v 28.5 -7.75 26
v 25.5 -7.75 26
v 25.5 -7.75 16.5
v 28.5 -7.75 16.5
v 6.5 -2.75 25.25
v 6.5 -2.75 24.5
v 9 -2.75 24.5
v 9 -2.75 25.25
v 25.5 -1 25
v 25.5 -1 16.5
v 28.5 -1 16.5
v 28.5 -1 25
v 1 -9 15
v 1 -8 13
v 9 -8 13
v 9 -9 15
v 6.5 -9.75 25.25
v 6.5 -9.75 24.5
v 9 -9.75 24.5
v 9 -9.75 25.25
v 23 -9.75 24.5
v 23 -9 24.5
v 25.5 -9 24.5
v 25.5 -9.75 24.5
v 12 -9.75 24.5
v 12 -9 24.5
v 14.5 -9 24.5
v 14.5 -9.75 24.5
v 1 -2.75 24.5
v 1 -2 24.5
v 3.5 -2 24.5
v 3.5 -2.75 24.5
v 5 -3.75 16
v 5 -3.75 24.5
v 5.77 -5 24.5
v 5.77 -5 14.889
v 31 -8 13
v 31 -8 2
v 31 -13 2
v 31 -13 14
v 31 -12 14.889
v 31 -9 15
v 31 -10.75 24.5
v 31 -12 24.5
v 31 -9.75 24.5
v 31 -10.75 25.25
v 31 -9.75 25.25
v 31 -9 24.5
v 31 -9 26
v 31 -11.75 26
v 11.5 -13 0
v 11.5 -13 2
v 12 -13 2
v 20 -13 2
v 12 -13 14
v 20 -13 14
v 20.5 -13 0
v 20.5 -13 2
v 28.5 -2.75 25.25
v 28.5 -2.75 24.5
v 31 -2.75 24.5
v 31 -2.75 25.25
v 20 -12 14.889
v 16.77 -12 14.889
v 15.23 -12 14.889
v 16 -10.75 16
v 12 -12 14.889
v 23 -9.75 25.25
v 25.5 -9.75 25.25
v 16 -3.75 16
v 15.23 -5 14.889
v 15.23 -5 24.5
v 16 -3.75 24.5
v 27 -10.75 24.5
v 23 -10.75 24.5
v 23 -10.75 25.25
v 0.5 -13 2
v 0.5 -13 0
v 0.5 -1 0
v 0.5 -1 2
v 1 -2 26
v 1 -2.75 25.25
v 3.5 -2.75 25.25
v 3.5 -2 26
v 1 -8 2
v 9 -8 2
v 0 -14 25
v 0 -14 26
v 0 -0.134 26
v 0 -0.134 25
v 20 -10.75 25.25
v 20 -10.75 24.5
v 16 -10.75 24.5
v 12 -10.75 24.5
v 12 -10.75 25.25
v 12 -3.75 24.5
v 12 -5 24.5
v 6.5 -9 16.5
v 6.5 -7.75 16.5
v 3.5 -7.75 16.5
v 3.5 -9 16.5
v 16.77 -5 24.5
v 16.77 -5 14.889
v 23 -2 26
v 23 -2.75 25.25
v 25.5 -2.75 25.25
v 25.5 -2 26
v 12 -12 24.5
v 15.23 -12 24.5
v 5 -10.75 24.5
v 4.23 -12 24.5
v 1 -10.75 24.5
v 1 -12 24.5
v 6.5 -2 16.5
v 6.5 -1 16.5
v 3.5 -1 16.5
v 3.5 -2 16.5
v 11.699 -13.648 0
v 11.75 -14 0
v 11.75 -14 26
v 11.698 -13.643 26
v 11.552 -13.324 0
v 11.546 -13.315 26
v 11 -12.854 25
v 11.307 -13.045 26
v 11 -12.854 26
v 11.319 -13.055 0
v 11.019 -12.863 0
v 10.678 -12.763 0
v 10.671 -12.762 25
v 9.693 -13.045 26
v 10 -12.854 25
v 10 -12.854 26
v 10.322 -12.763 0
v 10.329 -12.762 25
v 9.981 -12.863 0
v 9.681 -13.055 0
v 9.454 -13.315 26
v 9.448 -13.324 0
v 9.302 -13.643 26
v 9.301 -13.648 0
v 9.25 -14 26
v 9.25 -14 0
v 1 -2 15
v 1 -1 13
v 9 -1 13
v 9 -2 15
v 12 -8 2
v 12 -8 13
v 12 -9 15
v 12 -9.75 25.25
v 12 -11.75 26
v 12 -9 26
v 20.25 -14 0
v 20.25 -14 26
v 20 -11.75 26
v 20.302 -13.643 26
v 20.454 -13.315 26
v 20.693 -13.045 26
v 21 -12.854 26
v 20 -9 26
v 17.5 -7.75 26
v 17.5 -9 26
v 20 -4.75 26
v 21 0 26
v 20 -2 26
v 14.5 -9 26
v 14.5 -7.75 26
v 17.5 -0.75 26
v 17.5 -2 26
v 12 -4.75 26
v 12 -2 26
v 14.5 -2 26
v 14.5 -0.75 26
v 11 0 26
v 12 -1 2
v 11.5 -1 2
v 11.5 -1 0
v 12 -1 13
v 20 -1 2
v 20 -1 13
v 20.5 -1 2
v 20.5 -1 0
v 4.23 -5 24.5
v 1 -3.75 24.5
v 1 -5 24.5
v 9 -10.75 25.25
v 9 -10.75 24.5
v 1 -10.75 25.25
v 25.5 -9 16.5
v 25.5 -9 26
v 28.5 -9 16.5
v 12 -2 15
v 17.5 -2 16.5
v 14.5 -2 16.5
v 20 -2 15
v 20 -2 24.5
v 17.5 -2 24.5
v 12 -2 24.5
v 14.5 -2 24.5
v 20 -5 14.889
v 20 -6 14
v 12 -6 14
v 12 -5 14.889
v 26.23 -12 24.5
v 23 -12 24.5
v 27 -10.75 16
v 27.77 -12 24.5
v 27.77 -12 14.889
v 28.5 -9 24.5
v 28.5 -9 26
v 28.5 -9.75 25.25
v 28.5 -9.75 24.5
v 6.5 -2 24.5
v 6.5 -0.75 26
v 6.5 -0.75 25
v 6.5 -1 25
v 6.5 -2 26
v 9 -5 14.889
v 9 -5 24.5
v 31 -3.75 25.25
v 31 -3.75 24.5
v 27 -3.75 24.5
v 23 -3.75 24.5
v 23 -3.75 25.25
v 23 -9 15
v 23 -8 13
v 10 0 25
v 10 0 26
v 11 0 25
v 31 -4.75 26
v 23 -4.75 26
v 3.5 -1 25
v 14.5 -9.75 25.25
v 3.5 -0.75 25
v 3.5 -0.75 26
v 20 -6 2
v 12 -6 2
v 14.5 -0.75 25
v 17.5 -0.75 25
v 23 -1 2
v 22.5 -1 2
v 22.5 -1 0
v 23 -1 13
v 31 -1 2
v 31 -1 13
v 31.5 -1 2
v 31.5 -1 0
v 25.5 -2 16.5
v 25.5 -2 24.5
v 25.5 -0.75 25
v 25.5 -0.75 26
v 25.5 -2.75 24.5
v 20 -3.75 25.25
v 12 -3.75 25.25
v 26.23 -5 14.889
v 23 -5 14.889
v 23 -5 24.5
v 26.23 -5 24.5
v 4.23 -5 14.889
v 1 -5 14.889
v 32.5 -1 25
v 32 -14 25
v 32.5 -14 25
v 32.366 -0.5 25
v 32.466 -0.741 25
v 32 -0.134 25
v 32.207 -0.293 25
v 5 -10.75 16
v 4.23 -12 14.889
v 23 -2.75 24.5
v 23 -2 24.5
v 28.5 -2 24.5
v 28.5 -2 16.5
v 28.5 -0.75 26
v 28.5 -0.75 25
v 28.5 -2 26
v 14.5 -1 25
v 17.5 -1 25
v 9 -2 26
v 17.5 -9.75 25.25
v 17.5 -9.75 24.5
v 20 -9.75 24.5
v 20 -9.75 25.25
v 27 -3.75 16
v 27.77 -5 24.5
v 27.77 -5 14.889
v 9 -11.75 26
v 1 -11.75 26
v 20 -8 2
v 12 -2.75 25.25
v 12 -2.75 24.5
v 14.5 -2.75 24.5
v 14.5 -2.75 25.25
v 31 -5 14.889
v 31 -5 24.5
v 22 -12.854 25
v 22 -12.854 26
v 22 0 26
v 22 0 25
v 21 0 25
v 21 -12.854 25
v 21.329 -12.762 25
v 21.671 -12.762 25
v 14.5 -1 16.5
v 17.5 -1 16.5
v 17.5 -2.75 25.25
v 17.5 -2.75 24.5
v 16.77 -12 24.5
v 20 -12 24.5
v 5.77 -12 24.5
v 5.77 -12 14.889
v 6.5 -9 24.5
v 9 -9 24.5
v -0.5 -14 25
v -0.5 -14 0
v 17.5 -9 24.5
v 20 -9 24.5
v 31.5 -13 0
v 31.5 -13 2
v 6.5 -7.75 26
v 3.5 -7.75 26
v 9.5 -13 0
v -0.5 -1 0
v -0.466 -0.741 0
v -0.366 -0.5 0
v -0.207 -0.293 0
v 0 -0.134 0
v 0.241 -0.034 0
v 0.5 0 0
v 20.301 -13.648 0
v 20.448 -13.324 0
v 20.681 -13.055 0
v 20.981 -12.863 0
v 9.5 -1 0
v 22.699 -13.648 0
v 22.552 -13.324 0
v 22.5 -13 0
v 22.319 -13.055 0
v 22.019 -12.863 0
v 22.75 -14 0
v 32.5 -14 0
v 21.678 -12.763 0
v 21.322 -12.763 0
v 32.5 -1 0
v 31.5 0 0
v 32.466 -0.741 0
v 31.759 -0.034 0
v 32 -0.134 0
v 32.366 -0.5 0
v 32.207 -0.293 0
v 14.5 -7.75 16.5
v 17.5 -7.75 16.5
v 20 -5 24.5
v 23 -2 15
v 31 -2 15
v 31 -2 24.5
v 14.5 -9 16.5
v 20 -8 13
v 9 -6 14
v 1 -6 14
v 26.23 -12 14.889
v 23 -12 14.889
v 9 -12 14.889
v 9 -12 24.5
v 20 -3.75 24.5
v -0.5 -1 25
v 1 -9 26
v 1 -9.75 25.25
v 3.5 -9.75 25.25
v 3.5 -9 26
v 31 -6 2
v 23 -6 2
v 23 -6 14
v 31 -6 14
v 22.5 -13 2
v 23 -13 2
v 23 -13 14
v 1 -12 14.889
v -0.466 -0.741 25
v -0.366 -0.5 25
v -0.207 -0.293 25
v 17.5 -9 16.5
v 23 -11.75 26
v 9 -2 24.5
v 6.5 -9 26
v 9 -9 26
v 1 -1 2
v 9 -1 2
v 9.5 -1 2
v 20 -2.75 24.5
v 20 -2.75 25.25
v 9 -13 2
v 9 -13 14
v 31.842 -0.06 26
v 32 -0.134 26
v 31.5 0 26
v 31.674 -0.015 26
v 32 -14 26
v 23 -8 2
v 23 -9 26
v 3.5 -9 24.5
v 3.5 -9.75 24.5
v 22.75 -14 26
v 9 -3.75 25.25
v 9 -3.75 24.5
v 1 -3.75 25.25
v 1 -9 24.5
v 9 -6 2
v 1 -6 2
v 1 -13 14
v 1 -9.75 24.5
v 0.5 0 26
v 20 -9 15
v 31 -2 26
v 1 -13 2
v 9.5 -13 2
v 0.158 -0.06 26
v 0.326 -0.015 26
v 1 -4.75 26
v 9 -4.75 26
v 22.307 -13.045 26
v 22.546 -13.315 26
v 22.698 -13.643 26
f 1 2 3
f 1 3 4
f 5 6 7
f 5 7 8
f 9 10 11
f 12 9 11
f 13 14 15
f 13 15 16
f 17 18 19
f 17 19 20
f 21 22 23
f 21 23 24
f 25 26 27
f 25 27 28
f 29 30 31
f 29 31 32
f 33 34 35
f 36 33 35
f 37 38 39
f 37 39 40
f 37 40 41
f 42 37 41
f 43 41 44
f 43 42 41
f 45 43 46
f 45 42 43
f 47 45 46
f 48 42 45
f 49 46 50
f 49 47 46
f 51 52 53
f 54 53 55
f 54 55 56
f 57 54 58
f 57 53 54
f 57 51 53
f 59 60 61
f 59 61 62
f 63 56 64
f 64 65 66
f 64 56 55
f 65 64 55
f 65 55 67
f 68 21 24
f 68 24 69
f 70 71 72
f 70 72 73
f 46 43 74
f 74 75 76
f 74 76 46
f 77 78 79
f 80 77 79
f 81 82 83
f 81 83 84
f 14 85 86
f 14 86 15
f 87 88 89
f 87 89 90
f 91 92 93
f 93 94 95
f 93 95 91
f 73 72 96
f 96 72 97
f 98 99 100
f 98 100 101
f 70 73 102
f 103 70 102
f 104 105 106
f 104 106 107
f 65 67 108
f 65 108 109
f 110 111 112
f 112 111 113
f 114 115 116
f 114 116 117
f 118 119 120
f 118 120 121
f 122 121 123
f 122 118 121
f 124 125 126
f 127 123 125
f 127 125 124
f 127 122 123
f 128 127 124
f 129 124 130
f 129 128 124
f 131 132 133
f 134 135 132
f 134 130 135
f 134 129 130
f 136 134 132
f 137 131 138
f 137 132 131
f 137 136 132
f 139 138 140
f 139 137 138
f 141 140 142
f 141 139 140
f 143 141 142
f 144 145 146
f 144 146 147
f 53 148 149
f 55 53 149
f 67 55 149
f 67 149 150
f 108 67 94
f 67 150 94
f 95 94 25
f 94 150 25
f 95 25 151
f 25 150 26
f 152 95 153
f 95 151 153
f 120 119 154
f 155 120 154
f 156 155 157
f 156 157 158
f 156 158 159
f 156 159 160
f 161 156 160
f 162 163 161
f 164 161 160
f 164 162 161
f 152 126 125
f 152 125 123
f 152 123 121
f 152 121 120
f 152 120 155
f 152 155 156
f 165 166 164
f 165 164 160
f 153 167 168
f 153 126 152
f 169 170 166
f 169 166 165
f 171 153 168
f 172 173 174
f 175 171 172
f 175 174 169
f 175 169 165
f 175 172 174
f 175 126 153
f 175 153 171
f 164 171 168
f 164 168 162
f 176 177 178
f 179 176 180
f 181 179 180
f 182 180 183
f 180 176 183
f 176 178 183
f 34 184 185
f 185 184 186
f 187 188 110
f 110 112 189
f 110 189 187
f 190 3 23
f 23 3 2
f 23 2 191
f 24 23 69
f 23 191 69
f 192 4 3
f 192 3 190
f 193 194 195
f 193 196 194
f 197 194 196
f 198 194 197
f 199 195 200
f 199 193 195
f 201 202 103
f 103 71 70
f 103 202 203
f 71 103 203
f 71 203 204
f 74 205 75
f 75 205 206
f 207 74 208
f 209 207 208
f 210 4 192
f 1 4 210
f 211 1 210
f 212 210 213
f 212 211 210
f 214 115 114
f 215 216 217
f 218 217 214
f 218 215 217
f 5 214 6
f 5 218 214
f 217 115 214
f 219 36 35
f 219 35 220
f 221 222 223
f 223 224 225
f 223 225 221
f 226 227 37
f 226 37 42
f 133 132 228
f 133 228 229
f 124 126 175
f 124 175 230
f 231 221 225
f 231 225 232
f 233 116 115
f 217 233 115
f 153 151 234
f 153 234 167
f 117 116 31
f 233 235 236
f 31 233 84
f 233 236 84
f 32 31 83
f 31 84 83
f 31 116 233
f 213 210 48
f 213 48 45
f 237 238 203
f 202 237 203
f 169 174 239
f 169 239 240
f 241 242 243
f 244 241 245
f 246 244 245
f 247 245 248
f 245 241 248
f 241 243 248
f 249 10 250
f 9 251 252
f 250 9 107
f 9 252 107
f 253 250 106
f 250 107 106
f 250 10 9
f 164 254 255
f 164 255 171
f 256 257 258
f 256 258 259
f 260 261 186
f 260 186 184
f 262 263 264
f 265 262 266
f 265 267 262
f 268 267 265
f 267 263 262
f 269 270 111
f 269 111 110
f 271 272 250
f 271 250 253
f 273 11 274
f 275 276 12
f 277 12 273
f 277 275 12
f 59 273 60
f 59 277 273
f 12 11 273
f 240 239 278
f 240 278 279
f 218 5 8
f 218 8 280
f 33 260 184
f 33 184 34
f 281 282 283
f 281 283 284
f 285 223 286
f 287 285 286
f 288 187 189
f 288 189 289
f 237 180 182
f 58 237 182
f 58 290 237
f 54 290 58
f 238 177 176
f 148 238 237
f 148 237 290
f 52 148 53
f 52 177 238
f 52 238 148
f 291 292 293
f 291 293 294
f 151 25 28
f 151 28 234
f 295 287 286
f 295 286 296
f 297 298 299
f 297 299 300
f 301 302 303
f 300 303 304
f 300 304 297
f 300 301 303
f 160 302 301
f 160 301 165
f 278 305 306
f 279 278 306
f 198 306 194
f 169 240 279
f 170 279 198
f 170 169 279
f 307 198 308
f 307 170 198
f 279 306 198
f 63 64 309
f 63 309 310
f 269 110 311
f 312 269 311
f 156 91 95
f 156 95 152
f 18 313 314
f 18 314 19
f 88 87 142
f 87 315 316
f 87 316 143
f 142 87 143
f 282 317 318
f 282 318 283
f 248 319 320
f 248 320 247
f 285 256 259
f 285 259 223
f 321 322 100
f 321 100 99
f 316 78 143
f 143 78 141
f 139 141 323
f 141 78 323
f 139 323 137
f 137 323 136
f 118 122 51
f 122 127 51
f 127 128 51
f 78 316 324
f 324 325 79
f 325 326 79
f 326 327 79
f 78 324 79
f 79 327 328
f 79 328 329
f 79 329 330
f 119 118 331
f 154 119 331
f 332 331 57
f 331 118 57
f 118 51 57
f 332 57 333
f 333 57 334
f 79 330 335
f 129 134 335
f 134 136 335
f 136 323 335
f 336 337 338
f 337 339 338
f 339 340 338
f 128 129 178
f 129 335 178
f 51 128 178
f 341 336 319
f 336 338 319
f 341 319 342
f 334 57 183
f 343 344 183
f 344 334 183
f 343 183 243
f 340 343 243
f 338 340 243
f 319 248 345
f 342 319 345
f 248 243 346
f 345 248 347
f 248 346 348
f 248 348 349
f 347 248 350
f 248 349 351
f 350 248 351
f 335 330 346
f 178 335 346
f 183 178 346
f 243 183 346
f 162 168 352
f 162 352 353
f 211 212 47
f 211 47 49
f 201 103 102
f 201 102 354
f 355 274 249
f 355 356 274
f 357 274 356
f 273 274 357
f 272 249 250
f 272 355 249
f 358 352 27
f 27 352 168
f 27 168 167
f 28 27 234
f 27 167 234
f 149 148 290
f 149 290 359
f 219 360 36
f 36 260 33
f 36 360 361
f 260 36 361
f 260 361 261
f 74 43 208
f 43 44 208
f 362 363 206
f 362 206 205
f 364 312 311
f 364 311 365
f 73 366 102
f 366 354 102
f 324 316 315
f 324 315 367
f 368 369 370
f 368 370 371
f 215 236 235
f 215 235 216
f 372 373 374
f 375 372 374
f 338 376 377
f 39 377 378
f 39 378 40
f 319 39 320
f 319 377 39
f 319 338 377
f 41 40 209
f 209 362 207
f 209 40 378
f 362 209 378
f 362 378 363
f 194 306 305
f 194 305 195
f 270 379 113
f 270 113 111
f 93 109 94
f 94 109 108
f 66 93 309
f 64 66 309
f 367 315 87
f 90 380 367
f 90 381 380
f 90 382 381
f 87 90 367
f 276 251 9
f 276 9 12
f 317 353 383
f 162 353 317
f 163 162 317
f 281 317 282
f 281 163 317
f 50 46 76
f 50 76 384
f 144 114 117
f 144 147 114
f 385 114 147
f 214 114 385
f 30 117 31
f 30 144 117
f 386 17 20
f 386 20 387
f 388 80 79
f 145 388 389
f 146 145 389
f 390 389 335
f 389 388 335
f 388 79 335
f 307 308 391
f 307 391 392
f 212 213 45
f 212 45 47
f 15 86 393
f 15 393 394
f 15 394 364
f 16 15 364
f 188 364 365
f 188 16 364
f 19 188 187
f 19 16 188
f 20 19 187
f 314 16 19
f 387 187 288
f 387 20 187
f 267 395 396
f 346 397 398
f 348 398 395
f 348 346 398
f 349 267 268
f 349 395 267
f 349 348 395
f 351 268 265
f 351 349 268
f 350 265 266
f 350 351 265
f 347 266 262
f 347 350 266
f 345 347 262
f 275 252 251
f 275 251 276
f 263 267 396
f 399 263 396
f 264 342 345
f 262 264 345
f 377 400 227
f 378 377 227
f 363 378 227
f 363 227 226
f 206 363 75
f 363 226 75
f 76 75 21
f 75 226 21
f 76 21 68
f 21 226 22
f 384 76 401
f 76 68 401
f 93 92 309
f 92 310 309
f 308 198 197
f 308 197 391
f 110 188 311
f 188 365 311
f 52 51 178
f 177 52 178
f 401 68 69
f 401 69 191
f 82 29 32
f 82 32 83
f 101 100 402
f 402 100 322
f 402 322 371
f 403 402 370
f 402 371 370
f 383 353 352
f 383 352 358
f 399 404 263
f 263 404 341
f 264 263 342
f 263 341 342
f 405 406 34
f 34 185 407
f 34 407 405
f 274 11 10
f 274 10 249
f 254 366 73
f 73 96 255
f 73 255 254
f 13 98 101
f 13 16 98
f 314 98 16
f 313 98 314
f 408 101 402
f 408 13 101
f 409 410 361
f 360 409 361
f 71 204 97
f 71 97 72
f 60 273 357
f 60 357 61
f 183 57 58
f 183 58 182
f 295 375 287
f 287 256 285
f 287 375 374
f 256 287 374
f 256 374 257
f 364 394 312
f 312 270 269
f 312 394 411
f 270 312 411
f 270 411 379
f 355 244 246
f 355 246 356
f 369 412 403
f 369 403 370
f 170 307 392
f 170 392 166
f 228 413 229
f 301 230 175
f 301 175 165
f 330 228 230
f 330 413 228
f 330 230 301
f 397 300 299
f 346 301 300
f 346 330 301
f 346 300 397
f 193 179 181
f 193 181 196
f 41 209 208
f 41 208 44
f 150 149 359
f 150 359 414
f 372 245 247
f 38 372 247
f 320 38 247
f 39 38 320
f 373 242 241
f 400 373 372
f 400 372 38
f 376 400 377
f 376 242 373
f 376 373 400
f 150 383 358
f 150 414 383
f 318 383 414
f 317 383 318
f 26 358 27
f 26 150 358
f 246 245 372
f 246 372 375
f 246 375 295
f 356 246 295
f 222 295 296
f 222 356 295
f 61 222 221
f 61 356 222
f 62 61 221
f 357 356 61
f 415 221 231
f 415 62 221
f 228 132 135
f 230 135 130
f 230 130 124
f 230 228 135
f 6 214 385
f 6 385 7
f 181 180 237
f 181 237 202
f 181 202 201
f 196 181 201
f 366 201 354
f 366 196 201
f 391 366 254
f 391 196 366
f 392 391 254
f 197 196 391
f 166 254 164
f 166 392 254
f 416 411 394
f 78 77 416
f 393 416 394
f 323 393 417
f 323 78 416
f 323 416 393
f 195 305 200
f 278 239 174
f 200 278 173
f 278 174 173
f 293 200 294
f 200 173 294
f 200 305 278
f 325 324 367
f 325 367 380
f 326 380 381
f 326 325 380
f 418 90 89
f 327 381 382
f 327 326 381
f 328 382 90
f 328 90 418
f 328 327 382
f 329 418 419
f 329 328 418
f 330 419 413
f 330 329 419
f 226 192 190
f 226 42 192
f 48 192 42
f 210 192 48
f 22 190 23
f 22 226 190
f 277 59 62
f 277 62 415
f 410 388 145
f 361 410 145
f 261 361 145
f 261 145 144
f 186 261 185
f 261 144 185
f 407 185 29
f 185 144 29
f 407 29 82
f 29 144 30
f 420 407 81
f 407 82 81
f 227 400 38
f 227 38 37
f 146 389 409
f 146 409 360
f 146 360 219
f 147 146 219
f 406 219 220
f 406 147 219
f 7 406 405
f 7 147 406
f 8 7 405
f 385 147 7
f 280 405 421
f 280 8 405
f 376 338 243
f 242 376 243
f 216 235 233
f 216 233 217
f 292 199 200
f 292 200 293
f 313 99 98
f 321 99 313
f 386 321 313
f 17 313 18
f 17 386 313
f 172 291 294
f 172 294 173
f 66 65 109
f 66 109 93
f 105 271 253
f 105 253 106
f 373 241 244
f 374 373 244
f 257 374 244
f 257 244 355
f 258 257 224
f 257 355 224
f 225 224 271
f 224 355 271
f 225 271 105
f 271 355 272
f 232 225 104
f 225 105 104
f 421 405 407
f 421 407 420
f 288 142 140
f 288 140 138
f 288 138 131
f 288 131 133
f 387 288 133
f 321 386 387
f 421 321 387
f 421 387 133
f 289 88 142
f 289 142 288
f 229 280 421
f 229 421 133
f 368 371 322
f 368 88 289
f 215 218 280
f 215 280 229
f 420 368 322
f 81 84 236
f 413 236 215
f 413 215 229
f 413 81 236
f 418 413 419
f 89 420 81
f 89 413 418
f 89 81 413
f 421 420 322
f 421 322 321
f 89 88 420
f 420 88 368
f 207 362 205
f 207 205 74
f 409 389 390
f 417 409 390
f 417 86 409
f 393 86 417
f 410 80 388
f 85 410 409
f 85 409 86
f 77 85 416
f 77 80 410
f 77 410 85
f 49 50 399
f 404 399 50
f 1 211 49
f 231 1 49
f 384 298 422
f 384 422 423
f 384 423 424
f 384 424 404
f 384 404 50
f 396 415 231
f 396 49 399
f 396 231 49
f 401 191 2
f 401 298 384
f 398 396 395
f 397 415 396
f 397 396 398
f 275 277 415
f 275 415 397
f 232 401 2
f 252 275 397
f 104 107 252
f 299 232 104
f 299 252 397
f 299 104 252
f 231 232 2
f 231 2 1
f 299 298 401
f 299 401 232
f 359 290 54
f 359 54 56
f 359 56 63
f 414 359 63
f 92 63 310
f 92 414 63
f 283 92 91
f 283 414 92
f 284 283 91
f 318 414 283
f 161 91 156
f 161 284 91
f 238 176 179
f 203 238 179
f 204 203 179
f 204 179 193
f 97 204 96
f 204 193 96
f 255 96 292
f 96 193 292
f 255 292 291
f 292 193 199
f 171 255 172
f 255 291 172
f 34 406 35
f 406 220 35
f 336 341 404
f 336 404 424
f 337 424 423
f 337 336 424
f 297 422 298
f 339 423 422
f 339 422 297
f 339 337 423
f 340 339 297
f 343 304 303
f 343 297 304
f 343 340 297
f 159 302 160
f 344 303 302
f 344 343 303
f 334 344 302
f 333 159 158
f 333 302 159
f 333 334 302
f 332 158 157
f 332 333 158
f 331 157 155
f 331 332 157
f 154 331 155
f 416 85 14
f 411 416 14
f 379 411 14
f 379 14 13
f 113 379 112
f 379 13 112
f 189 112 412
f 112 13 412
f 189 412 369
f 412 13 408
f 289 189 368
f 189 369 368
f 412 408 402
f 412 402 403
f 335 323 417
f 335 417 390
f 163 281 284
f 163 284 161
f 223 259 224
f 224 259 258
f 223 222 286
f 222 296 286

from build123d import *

# Parameters (mm, degrees)
EXTRUDE001_DEPTH        = 30
EXTRUDE_DEPTH           = 30
PAD003_DEPTH            = 10
SKETCH010_W             = 1
SKETCH010_H             = 24
PAD004_DEPTH            = 6
SKETCH011_W             = 2
SKETCH011_H             = 3
POCKET005_DEPTH         = 9.5
POCKET006_DEPTH         = 22.5
BODY002_PLACEMENT_ANGLE = 90
SKETCH_W                = 33
SKETCH_H                = 14
PAD_DEPTH               = 25
SKETCH012_W             = 9
SKETCH012_H             = 12
POCKET_DEPTH            = 25.001


with BuildPart() as rounded:
    # Sketch014 → Extrude001 (new body)
    with BuildSketch(Plane(origin=(0, 0, 0), x_dir=(1, 0, 0), z_dir=(0, 0, -1))):
        with BuildLine():
            ThreePointArc((-0.5, 1), (-0.207107, 0.292893), (0.5, 0))
            Line((0.5, 0), (31.5, 0))
            ThreePointArc((31.5, 0), (32.207107, 0.292893), (32.5, 1))
            Line((32.5, 1), (37.5, 1))
            Line((37.5, 1), (37.5, -4))
            Line((-5.5, -4), (37.5, -4))
            Line((-5.5, 1), (-5.5, -4))
            Line((-0.5, 1), (-5.5, 1))
        make_face()
    extrude(amount=-EXTRUDE001_DEPTH)


with BuildPart() as extrude_body:
    # Sketch013 → Extrude (new body)
    with BuildSketch(Plane.XY):
        with BuildLine():
            ThreePointArc((11.75, -14), (10.5, -12.75), (9.25, -14))
            Line((9.25, -14), (9.25, -15))
            Line((9.25, -15), (22.75, -15))
            Line((22.75, -15), (22.75, -14))
            ThreePointArc((22.75, -14), (21.5, -12.75), (20.25, -14))
            Line((11.75, -14), (20.25, -14))
        make_face()
    extrude(amount=EXTRUDE_DEPTH)


with BuildPart() as pinhousing:
    # Sketch009 → Pad003 (new body)
    with BuildSketch(Plane.YZ):
        Polygon((0, 0), (0, 1), (11, 1), (13, 2), (22.5, 2), (22.5, 2.75), (23.25, 2.75), (24, 2), (24, 0), align=None)
        Polygon((0, 6), (12, 6), (14, 3.75), (23.25, 3.75), (24, 4.75), (24, 7), (0, 7), align=None)
    extrude(amount=PAD003_DEPTH)

    # Sketch010 → Pad004 (join)
    with BuildSketch(Plane.XY):
        with Locations((0.5, 12)):
            Rectangle(SKETCH010_W, SKETCH010_H)
        with Locations((9.5, 12)):
            Rectangle(SKETCH010_W, SKETCH010_H)
    extrude(amount=PAD004_DEPTH)

    # Sketch011 (on Face17 of Pad003) → Pocket005 (cut)
    with BuildSketch(Plane.ZX.offset(24)):
        with Locations((1.75, 5)):
            Rectangle(SKETCH011_W, SKETCH011_H)
    extrude(amount=-POCKET005_DEPTH, mode=Mode.SUBTRACT)

    # Sketch003 → Pocket006 (cut)
    with BuildSketch(Plane.XZ):
        Polygon((1, 5), (4.23, 5), (5, 3.75), (5.77, 5), (9, 5), (9, 3.5), (1, 3.5), align=None)
    extrude(amount=-POCKET006_DEPTH, mode=Mode.SUBTRACT)


with BuildPart() as pinhousing_1:
    # Body002 placement: moved
    add(pinhousing.part.moved(Location((0, 0, 2))).rotate(Axis((0, 0, 2), (1, 0, 0)), BODY002_PLACEMENT_ANGLE))


with BuildPart() as pin6:
    # Body007 base: copy of PinHousing
    add(pinhousing_1.part)


with BuildPart() as pin6_1:
    # Body007 placement: moved
    add(pin6.part.moved(Location((22, -7, 0))))


with BuildPart() as pin5:
    # Body006 base: copy of PinHousing
    add(pinhousing_1.part)


with BuildPart() as pin5_1:
    # Body006 placement: moved
    add(pin5.part.moved(Location((11, -7, 0))))


with BuildPart() as pin4:
    # Body005 base: copy of PinHousing
    add(pinhousing_1.part)


with BuildPart() as pin4_1:
    # Body005 placement: moved
    add(pin4.part.moved(Location((0, -7, 0))))


with BuildPart() as pin3:
    # Body004 base: copy of PinHousing
    add(pinhousing_1.part)


with BuildPart() as pin3_1:
    # Body004 placement: moved
    add(pin3.part.moved(Location((22, 0, 0))))


with BuildPart() as pin2:
    # Body003 base: copy of PinHousing
    add(pinhousing_1.part)


with BuildPart() as pin2_1:
    # Body003 placement: moved
    add(pin2.part.moved(Location((11, 0, 0))))


with BuildPart() as pin1:
    # Body base: copy of PinHousing
    add(pinhousing_1.part)


with BuildPart() as finaldipplug:
    # Sketch → Pad (new body)
    with BuildSketch(Plane.XY):
        with Locations((16, -7)):
            Rectangle(SKETCH_W, SKETCH_H)
    extrude(amount=PAD_DEPTH)

    # Sketch012 → Pocket (cut, through all)
    with BuildSketch(Plane.XY):
        with Locations((5, -7)):
            Rectangle(SKETCH012_W, SKETCH012_H)
        with Locations((16, -7)):
            Rectangle(SKETCH012_W, SKETCH012_H)
        with Locations((27, -7)):
            Rectangle(SKETCH012_W, SKETCH012_H)
    extrude(amount=POCKET_DEPTH, mode=Mode.SUBTRACT)

    # Fusion: union Pin6, Pin5, Pin4, Pin3, Pin2, Pin1
    add(pin6_1.part)
    add(pin5_1.part)
    add(pin4_1.part)
    add(pin3_1.part)
    add(pin2_1.part)
    add(pin1.part)

    # Cut: cut Extrude body
    add(extrude_body.part, mode=Mode.SUBTRACT)

    # Cut001: cut Rounded
    add(rounded.part, mode=Mode.SUBTRACT)


solid = finaldipplug.part
